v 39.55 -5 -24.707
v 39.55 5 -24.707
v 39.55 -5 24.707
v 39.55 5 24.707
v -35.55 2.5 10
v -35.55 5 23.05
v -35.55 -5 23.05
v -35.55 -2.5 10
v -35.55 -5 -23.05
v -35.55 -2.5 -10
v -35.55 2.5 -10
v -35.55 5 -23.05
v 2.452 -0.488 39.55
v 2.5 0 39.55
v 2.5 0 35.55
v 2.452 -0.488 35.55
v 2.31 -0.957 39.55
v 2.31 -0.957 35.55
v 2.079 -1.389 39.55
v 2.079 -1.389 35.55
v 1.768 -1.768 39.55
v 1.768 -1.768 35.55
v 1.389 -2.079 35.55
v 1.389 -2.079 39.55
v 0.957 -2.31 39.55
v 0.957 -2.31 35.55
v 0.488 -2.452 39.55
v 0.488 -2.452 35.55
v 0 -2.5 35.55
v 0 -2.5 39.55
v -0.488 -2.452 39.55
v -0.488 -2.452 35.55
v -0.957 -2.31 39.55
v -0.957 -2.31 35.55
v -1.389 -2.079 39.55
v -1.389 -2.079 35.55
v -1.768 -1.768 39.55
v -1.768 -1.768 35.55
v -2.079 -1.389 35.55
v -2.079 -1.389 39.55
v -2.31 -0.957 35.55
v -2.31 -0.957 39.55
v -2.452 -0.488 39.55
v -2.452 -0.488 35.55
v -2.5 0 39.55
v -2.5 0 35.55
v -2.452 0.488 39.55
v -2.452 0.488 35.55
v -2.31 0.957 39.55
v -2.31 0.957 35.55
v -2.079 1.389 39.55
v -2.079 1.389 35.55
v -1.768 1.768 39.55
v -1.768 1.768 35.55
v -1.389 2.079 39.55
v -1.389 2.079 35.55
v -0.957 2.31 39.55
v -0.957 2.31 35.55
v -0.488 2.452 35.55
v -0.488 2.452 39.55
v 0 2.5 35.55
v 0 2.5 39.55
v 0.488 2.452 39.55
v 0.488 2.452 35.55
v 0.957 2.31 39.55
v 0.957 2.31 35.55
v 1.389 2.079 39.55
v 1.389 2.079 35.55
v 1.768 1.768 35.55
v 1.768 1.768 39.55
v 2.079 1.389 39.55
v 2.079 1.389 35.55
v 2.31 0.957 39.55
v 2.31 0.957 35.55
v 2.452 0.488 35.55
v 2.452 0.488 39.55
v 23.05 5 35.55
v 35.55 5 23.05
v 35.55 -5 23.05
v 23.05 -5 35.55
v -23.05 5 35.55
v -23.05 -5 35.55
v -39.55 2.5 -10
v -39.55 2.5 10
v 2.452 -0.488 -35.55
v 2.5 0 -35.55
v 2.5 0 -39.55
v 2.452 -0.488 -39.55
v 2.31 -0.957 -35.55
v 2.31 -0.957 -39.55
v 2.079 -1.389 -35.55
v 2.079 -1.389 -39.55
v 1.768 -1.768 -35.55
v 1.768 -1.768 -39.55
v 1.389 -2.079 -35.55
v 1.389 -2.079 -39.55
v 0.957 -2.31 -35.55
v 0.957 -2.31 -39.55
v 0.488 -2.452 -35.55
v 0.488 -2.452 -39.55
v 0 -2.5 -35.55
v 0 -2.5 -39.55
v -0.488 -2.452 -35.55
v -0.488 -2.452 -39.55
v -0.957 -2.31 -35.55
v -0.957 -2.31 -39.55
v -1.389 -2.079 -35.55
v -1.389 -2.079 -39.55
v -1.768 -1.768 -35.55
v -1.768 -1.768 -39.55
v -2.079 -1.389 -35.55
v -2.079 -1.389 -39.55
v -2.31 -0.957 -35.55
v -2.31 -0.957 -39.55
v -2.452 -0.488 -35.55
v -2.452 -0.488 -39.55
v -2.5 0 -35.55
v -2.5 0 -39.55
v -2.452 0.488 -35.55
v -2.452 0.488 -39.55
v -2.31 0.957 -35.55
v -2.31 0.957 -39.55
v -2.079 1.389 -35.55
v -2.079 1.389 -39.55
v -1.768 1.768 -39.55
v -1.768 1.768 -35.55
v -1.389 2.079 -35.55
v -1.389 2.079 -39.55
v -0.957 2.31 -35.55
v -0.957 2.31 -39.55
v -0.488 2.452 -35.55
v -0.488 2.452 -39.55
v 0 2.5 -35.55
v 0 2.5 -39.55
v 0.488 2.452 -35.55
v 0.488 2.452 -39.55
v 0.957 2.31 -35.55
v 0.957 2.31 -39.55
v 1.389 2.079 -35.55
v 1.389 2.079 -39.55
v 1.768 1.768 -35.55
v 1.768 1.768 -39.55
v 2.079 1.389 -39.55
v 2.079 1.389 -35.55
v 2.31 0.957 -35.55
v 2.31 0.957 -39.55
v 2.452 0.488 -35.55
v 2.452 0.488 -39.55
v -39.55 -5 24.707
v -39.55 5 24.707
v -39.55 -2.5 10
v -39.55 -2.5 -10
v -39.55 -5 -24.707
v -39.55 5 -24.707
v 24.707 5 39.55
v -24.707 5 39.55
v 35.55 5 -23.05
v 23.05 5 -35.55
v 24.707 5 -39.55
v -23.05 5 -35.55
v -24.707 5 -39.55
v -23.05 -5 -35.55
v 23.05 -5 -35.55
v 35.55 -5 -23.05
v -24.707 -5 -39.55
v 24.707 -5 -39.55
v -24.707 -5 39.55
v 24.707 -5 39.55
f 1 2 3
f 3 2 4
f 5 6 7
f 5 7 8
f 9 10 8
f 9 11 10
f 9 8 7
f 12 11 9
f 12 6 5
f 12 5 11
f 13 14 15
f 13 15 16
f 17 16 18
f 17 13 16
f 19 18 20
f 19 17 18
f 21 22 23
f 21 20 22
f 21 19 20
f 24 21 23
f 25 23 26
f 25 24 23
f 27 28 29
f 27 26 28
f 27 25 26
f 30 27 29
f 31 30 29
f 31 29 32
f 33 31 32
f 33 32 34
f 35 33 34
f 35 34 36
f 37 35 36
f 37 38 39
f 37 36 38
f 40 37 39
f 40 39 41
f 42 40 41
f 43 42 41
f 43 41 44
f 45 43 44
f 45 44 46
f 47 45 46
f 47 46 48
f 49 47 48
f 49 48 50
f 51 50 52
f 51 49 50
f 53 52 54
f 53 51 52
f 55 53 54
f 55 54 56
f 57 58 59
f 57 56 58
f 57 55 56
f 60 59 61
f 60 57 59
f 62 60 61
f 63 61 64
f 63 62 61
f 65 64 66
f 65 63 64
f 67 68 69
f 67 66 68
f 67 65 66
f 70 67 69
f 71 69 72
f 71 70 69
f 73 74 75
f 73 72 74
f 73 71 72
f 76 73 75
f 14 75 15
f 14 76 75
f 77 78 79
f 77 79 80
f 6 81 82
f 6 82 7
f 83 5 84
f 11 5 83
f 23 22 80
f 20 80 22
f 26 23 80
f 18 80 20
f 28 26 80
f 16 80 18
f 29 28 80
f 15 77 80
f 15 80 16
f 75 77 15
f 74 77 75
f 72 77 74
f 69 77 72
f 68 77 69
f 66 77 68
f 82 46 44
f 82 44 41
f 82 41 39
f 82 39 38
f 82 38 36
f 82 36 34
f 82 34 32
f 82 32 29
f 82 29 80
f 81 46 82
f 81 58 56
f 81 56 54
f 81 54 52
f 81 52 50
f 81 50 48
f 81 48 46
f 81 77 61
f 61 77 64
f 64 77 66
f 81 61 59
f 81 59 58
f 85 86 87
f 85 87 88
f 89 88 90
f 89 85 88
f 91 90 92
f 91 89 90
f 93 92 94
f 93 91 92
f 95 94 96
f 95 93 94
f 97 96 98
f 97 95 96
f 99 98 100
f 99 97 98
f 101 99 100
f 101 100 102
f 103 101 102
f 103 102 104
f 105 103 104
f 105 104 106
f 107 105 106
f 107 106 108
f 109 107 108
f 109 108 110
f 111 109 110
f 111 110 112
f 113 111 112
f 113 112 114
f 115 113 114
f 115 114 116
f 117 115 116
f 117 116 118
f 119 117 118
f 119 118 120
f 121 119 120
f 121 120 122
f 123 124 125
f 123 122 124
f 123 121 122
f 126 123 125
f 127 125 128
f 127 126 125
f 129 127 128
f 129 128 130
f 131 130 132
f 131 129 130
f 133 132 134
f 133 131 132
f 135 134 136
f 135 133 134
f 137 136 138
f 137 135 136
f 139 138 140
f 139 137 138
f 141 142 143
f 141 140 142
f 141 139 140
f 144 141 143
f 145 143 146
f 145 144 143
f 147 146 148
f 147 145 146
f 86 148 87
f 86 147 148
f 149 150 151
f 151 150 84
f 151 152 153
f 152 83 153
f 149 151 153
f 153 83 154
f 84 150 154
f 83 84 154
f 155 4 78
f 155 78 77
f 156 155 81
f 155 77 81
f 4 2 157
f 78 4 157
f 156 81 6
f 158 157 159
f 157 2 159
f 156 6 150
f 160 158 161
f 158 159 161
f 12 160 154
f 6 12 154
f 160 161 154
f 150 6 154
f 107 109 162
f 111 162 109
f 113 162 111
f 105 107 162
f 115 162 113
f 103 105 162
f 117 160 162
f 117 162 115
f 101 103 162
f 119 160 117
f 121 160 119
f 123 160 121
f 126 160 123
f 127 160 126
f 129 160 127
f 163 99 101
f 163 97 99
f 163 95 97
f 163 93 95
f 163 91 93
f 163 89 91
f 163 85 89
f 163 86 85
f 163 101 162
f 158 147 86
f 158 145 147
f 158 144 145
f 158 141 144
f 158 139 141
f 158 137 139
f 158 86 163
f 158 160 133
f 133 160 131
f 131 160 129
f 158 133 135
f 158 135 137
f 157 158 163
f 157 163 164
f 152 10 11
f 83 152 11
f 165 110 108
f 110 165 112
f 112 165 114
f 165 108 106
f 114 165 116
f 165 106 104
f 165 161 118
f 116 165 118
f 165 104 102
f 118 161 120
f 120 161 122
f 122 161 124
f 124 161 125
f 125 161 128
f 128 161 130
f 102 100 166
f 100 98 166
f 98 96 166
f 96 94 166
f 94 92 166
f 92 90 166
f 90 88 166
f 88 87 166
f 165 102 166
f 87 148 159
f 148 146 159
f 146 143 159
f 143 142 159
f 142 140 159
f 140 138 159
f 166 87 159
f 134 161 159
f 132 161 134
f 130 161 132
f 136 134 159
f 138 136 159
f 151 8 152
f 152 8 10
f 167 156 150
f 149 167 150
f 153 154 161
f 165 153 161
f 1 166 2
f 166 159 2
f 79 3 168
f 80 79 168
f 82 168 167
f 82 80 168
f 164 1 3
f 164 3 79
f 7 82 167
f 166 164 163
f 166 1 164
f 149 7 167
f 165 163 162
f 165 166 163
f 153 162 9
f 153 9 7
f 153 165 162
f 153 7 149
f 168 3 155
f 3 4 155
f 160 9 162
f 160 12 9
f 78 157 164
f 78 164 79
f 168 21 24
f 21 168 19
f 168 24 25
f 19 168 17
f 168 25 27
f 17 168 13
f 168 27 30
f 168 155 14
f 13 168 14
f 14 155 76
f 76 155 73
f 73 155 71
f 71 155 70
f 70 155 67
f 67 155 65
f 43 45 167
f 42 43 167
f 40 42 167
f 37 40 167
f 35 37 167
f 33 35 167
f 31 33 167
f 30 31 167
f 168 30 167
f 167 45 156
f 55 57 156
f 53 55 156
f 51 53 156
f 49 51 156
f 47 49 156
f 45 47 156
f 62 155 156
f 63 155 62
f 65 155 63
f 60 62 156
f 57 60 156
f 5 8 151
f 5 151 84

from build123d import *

# Parameters (mm, degrees)
BOSS_EXTRUDE1_DEPTH     = 5
CUT_EXTRUDE2_START      = -75.1
SKETCH3_W               = 20
SKETCH3_H               = 5
CUT_EXTRUDE2_DEPTH      = 14.477720111
CUT_EXTRUDE3_DEPTH      = 89.577720111
CUT_EXTRUDE3_DEPTH_BACK = 89.577720111
SKETCH4_R               = 2.5


with BuildPart() as part:
    # Sketch1 → Boss-Extrude1 (new, symmetric)
    with BuildSketch(Plane(origin=(0, 0, 0), x_dir=(1, 0, 0), z_dir=(0, 1, 0))):
        Polygon((-24.706854249, 39.55), (24.706854249, 39.55), (39.55, 24.706854249), (39.55, -24.706854249), (24.706854249, -39.55), (-24.706854249, -39.55), (-39.55, -24.706854249), (-39.55, 24.706854249), align=None)
        Polygon((-35.55, 23.05), (-23.05, 35.55), (23.05, 35.55), (35.55, 23.05), (35.55, -23.05), (23.05, -35.55), (-23.05, -35.55), (-35.55, -23.05), align=None, mode=Mode.SUBTRACT)
    extrude(amount=BOSS_EXTRUDE1_DEPTH, both=True)

    # Sketch3 → Cut-Extrude2 (cut, through all)
    with BuildSketch(Plane(origin=(39.55, 0, 0), x_dir=(0, 0, -1), z_dir=(1, 0, 0)).offset(CUT_EXTRUDE2_START)):
        Rectangle(SKETCH3_W, SKETCH3_H)
    extrude(amount=-CUT_EXTRUDE2_DEPTH, mode=Mode.SUBTRACT)

    # Sketch4 → Cut-Extrude3 (cut, two sides: drawn at the far end of the back side and taken through both)
    with BuildSketch(Plane(origin=(0, 0, -39.55), x_dir=(-1, 0, 0), z_dir=(0, 0, -1)).offset(-CUT_EXTRUDE3_DEPTH_BACK)):
        with Locations(Location((0, 0, 0), (0, 0, 180))):
            Circle(SKETCH4_R)
    extrude(amount=CUT_EXTRUDE3_DEPTH + CUT_EXTRUDE3_DEPTH_BACK, mode=Mode.SUBTRACT)


solid = part.part
